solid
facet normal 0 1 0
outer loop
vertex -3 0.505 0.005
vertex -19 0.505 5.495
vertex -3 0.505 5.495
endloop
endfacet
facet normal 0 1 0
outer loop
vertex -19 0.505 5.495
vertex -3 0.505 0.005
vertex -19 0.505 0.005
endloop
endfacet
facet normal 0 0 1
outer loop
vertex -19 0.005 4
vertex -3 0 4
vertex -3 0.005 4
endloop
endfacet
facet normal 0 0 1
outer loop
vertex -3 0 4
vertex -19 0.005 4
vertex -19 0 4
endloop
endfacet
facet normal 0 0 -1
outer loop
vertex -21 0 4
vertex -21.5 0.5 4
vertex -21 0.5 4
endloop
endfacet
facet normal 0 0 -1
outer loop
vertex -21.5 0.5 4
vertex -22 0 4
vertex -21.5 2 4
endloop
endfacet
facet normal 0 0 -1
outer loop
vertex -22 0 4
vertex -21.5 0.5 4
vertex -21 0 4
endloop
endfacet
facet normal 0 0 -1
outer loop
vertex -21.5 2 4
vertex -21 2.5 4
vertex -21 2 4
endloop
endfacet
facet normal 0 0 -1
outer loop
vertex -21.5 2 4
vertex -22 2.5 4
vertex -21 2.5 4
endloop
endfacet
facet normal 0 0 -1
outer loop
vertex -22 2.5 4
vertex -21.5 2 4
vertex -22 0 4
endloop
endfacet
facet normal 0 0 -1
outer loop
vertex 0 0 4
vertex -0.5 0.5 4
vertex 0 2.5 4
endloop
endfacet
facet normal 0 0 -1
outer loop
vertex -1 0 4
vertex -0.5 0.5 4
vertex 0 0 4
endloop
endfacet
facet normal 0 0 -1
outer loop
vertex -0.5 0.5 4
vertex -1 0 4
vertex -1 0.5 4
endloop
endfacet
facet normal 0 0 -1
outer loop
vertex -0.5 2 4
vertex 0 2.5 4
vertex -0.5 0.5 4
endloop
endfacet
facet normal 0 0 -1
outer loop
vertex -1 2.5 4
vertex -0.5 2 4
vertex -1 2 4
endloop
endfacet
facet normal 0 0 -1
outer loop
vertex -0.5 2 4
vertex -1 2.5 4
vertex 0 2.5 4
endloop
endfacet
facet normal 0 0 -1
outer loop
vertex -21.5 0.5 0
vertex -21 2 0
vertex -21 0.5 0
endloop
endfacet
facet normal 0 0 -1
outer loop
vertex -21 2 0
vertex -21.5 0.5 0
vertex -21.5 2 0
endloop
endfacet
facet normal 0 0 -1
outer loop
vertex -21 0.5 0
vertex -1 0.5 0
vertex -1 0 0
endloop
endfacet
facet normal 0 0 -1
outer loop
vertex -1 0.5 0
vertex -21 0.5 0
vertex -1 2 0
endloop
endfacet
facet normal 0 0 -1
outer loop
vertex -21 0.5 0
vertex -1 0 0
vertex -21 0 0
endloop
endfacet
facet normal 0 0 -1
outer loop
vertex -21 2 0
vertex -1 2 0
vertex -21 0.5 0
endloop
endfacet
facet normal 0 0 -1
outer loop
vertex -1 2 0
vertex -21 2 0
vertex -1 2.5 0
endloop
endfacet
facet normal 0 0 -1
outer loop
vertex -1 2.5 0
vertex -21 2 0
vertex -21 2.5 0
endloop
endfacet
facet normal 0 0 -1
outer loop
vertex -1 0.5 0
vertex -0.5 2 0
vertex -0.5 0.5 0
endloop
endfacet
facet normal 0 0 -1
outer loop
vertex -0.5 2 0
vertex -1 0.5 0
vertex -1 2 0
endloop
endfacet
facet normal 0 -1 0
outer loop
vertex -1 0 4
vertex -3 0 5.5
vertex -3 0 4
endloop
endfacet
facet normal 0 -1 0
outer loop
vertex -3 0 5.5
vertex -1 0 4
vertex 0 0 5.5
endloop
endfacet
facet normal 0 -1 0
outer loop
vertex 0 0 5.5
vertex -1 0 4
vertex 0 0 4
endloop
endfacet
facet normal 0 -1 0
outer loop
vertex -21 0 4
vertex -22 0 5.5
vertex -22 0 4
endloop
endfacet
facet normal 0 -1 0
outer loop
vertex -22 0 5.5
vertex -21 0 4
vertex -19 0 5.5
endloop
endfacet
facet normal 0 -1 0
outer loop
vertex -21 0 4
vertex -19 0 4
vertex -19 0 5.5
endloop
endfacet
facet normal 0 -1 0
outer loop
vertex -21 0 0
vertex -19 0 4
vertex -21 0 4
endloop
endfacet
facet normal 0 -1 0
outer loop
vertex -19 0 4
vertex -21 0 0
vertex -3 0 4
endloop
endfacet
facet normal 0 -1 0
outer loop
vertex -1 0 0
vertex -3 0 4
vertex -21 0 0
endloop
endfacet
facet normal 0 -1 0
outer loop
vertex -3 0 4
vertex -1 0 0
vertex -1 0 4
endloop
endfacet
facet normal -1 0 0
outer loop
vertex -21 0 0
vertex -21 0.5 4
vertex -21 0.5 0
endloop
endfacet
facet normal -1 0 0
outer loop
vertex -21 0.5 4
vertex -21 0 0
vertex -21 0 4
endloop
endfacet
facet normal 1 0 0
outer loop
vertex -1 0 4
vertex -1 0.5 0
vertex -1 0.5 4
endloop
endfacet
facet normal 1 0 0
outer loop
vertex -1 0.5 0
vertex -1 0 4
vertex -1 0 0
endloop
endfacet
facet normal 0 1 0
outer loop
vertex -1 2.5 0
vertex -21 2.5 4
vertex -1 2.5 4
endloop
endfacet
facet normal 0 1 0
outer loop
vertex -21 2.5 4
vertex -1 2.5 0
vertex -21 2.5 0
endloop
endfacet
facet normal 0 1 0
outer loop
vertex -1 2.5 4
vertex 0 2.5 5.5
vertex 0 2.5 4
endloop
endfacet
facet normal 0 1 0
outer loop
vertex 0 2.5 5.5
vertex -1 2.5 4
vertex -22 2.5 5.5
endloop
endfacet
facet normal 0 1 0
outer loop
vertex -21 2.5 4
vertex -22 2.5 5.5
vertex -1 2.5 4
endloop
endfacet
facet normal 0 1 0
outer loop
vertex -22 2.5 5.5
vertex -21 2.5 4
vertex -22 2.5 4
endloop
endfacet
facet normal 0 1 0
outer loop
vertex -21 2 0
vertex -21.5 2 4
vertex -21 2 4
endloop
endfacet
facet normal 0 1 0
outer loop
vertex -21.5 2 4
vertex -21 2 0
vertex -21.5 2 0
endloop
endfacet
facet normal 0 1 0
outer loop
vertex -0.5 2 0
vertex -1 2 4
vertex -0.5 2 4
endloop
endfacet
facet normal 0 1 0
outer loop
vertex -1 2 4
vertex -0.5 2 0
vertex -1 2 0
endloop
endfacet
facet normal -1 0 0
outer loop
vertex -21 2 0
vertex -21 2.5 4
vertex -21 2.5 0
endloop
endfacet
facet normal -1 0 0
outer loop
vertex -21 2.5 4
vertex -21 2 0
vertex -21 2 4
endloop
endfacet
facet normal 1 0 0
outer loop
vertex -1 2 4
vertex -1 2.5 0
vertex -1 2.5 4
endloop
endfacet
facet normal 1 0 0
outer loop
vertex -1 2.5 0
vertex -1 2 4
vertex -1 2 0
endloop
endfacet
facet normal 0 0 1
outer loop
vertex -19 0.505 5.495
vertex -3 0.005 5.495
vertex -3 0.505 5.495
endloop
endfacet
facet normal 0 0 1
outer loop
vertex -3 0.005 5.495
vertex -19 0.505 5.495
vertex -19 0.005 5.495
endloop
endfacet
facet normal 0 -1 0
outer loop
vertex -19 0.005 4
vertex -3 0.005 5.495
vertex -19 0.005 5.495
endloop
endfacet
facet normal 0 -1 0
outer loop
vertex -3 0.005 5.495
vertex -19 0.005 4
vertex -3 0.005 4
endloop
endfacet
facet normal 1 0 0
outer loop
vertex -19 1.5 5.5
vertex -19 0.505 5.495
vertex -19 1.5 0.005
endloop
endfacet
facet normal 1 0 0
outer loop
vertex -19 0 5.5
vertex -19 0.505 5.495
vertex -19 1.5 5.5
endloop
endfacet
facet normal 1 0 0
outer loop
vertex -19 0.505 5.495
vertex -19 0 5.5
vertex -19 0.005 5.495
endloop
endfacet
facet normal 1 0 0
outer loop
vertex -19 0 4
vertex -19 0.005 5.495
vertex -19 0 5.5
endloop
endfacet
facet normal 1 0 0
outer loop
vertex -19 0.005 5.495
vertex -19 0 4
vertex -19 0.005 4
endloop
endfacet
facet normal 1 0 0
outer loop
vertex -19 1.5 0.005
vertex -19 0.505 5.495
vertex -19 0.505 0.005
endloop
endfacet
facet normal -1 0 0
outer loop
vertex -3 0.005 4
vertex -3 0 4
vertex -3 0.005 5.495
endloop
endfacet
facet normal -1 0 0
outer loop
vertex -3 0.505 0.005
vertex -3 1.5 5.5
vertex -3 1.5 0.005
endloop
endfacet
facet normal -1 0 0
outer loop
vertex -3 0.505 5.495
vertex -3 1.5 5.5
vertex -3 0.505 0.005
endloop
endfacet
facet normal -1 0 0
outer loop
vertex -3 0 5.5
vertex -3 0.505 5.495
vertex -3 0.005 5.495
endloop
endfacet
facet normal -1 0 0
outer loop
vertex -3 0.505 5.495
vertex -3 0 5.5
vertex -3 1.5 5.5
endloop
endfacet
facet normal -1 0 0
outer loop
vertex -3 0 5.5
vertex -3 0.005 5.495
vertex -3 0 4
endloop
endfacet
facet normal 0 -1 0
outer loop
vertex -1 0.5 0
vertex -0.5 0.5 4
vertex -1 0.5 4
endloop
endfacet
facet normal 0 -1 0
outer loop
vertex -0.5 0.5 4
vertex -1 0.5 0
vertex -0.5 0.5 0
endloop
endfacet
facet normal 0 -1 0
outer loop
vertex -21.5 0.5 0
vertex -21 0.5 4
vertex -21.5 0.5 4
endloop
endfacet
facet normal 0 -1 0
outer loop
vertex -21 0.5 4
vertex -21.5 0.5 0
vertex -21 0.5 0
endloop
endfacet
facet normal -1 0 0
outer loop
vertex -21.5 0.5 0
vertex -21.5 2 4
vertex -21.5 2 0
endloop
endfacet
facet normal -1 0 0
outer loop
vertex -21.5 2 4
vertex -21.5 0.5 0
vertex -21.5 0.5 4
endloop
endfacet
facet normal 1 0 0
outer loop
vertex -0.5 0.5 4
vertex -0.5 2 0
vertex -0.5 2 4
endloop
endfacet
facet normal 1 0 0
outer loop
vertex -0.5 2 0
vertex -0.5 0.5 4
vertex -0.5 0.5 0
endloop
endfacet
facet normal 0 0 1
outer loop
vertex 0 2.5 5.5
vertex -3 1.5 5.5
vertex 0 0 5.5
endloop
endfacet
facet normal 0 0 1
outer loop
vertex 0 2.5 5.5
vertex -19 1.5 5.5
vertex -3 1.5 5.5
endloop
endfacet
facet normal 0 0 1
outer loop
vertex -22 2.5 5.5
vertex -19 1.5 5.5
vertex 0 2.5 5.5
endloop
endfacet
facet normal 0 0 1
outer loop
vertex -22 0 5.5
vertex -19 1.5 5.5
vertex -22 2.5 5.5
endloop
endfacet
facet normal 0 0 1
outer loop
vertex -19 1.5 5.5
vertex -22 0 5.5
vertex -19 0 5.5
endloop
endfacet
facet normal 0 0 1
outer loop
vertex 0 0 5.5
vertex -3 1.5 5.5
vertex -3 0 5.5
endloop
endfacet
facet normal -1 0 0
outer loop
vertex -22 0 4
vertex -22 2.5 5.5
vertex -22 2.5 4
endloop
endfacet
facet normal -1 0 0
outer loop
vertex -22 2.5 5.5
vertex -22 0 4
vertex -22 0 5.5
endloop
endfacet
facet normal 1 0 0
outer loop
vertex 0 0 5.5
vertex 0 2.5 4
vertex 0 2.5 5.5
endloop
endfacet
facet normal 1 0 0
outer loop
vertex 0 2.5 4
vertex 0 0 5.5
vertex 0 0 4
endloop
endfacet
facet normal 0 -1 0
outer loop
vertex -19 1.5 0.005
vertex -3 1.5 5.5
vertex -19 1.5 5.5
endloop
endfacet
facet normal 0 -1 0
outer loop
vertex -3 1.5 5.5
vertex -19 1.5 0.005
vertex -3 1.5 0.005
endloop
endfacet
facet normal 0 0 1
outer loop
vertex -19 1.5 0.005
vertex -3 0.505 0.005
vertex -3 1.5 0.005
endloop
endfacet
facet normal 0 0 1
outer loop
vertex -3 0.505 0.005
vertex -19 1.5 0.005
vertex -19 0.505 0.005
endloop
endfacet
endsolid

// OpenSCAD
include <../../lib/device/component.scad>;

rotate([0,0,90]) serialcon();
